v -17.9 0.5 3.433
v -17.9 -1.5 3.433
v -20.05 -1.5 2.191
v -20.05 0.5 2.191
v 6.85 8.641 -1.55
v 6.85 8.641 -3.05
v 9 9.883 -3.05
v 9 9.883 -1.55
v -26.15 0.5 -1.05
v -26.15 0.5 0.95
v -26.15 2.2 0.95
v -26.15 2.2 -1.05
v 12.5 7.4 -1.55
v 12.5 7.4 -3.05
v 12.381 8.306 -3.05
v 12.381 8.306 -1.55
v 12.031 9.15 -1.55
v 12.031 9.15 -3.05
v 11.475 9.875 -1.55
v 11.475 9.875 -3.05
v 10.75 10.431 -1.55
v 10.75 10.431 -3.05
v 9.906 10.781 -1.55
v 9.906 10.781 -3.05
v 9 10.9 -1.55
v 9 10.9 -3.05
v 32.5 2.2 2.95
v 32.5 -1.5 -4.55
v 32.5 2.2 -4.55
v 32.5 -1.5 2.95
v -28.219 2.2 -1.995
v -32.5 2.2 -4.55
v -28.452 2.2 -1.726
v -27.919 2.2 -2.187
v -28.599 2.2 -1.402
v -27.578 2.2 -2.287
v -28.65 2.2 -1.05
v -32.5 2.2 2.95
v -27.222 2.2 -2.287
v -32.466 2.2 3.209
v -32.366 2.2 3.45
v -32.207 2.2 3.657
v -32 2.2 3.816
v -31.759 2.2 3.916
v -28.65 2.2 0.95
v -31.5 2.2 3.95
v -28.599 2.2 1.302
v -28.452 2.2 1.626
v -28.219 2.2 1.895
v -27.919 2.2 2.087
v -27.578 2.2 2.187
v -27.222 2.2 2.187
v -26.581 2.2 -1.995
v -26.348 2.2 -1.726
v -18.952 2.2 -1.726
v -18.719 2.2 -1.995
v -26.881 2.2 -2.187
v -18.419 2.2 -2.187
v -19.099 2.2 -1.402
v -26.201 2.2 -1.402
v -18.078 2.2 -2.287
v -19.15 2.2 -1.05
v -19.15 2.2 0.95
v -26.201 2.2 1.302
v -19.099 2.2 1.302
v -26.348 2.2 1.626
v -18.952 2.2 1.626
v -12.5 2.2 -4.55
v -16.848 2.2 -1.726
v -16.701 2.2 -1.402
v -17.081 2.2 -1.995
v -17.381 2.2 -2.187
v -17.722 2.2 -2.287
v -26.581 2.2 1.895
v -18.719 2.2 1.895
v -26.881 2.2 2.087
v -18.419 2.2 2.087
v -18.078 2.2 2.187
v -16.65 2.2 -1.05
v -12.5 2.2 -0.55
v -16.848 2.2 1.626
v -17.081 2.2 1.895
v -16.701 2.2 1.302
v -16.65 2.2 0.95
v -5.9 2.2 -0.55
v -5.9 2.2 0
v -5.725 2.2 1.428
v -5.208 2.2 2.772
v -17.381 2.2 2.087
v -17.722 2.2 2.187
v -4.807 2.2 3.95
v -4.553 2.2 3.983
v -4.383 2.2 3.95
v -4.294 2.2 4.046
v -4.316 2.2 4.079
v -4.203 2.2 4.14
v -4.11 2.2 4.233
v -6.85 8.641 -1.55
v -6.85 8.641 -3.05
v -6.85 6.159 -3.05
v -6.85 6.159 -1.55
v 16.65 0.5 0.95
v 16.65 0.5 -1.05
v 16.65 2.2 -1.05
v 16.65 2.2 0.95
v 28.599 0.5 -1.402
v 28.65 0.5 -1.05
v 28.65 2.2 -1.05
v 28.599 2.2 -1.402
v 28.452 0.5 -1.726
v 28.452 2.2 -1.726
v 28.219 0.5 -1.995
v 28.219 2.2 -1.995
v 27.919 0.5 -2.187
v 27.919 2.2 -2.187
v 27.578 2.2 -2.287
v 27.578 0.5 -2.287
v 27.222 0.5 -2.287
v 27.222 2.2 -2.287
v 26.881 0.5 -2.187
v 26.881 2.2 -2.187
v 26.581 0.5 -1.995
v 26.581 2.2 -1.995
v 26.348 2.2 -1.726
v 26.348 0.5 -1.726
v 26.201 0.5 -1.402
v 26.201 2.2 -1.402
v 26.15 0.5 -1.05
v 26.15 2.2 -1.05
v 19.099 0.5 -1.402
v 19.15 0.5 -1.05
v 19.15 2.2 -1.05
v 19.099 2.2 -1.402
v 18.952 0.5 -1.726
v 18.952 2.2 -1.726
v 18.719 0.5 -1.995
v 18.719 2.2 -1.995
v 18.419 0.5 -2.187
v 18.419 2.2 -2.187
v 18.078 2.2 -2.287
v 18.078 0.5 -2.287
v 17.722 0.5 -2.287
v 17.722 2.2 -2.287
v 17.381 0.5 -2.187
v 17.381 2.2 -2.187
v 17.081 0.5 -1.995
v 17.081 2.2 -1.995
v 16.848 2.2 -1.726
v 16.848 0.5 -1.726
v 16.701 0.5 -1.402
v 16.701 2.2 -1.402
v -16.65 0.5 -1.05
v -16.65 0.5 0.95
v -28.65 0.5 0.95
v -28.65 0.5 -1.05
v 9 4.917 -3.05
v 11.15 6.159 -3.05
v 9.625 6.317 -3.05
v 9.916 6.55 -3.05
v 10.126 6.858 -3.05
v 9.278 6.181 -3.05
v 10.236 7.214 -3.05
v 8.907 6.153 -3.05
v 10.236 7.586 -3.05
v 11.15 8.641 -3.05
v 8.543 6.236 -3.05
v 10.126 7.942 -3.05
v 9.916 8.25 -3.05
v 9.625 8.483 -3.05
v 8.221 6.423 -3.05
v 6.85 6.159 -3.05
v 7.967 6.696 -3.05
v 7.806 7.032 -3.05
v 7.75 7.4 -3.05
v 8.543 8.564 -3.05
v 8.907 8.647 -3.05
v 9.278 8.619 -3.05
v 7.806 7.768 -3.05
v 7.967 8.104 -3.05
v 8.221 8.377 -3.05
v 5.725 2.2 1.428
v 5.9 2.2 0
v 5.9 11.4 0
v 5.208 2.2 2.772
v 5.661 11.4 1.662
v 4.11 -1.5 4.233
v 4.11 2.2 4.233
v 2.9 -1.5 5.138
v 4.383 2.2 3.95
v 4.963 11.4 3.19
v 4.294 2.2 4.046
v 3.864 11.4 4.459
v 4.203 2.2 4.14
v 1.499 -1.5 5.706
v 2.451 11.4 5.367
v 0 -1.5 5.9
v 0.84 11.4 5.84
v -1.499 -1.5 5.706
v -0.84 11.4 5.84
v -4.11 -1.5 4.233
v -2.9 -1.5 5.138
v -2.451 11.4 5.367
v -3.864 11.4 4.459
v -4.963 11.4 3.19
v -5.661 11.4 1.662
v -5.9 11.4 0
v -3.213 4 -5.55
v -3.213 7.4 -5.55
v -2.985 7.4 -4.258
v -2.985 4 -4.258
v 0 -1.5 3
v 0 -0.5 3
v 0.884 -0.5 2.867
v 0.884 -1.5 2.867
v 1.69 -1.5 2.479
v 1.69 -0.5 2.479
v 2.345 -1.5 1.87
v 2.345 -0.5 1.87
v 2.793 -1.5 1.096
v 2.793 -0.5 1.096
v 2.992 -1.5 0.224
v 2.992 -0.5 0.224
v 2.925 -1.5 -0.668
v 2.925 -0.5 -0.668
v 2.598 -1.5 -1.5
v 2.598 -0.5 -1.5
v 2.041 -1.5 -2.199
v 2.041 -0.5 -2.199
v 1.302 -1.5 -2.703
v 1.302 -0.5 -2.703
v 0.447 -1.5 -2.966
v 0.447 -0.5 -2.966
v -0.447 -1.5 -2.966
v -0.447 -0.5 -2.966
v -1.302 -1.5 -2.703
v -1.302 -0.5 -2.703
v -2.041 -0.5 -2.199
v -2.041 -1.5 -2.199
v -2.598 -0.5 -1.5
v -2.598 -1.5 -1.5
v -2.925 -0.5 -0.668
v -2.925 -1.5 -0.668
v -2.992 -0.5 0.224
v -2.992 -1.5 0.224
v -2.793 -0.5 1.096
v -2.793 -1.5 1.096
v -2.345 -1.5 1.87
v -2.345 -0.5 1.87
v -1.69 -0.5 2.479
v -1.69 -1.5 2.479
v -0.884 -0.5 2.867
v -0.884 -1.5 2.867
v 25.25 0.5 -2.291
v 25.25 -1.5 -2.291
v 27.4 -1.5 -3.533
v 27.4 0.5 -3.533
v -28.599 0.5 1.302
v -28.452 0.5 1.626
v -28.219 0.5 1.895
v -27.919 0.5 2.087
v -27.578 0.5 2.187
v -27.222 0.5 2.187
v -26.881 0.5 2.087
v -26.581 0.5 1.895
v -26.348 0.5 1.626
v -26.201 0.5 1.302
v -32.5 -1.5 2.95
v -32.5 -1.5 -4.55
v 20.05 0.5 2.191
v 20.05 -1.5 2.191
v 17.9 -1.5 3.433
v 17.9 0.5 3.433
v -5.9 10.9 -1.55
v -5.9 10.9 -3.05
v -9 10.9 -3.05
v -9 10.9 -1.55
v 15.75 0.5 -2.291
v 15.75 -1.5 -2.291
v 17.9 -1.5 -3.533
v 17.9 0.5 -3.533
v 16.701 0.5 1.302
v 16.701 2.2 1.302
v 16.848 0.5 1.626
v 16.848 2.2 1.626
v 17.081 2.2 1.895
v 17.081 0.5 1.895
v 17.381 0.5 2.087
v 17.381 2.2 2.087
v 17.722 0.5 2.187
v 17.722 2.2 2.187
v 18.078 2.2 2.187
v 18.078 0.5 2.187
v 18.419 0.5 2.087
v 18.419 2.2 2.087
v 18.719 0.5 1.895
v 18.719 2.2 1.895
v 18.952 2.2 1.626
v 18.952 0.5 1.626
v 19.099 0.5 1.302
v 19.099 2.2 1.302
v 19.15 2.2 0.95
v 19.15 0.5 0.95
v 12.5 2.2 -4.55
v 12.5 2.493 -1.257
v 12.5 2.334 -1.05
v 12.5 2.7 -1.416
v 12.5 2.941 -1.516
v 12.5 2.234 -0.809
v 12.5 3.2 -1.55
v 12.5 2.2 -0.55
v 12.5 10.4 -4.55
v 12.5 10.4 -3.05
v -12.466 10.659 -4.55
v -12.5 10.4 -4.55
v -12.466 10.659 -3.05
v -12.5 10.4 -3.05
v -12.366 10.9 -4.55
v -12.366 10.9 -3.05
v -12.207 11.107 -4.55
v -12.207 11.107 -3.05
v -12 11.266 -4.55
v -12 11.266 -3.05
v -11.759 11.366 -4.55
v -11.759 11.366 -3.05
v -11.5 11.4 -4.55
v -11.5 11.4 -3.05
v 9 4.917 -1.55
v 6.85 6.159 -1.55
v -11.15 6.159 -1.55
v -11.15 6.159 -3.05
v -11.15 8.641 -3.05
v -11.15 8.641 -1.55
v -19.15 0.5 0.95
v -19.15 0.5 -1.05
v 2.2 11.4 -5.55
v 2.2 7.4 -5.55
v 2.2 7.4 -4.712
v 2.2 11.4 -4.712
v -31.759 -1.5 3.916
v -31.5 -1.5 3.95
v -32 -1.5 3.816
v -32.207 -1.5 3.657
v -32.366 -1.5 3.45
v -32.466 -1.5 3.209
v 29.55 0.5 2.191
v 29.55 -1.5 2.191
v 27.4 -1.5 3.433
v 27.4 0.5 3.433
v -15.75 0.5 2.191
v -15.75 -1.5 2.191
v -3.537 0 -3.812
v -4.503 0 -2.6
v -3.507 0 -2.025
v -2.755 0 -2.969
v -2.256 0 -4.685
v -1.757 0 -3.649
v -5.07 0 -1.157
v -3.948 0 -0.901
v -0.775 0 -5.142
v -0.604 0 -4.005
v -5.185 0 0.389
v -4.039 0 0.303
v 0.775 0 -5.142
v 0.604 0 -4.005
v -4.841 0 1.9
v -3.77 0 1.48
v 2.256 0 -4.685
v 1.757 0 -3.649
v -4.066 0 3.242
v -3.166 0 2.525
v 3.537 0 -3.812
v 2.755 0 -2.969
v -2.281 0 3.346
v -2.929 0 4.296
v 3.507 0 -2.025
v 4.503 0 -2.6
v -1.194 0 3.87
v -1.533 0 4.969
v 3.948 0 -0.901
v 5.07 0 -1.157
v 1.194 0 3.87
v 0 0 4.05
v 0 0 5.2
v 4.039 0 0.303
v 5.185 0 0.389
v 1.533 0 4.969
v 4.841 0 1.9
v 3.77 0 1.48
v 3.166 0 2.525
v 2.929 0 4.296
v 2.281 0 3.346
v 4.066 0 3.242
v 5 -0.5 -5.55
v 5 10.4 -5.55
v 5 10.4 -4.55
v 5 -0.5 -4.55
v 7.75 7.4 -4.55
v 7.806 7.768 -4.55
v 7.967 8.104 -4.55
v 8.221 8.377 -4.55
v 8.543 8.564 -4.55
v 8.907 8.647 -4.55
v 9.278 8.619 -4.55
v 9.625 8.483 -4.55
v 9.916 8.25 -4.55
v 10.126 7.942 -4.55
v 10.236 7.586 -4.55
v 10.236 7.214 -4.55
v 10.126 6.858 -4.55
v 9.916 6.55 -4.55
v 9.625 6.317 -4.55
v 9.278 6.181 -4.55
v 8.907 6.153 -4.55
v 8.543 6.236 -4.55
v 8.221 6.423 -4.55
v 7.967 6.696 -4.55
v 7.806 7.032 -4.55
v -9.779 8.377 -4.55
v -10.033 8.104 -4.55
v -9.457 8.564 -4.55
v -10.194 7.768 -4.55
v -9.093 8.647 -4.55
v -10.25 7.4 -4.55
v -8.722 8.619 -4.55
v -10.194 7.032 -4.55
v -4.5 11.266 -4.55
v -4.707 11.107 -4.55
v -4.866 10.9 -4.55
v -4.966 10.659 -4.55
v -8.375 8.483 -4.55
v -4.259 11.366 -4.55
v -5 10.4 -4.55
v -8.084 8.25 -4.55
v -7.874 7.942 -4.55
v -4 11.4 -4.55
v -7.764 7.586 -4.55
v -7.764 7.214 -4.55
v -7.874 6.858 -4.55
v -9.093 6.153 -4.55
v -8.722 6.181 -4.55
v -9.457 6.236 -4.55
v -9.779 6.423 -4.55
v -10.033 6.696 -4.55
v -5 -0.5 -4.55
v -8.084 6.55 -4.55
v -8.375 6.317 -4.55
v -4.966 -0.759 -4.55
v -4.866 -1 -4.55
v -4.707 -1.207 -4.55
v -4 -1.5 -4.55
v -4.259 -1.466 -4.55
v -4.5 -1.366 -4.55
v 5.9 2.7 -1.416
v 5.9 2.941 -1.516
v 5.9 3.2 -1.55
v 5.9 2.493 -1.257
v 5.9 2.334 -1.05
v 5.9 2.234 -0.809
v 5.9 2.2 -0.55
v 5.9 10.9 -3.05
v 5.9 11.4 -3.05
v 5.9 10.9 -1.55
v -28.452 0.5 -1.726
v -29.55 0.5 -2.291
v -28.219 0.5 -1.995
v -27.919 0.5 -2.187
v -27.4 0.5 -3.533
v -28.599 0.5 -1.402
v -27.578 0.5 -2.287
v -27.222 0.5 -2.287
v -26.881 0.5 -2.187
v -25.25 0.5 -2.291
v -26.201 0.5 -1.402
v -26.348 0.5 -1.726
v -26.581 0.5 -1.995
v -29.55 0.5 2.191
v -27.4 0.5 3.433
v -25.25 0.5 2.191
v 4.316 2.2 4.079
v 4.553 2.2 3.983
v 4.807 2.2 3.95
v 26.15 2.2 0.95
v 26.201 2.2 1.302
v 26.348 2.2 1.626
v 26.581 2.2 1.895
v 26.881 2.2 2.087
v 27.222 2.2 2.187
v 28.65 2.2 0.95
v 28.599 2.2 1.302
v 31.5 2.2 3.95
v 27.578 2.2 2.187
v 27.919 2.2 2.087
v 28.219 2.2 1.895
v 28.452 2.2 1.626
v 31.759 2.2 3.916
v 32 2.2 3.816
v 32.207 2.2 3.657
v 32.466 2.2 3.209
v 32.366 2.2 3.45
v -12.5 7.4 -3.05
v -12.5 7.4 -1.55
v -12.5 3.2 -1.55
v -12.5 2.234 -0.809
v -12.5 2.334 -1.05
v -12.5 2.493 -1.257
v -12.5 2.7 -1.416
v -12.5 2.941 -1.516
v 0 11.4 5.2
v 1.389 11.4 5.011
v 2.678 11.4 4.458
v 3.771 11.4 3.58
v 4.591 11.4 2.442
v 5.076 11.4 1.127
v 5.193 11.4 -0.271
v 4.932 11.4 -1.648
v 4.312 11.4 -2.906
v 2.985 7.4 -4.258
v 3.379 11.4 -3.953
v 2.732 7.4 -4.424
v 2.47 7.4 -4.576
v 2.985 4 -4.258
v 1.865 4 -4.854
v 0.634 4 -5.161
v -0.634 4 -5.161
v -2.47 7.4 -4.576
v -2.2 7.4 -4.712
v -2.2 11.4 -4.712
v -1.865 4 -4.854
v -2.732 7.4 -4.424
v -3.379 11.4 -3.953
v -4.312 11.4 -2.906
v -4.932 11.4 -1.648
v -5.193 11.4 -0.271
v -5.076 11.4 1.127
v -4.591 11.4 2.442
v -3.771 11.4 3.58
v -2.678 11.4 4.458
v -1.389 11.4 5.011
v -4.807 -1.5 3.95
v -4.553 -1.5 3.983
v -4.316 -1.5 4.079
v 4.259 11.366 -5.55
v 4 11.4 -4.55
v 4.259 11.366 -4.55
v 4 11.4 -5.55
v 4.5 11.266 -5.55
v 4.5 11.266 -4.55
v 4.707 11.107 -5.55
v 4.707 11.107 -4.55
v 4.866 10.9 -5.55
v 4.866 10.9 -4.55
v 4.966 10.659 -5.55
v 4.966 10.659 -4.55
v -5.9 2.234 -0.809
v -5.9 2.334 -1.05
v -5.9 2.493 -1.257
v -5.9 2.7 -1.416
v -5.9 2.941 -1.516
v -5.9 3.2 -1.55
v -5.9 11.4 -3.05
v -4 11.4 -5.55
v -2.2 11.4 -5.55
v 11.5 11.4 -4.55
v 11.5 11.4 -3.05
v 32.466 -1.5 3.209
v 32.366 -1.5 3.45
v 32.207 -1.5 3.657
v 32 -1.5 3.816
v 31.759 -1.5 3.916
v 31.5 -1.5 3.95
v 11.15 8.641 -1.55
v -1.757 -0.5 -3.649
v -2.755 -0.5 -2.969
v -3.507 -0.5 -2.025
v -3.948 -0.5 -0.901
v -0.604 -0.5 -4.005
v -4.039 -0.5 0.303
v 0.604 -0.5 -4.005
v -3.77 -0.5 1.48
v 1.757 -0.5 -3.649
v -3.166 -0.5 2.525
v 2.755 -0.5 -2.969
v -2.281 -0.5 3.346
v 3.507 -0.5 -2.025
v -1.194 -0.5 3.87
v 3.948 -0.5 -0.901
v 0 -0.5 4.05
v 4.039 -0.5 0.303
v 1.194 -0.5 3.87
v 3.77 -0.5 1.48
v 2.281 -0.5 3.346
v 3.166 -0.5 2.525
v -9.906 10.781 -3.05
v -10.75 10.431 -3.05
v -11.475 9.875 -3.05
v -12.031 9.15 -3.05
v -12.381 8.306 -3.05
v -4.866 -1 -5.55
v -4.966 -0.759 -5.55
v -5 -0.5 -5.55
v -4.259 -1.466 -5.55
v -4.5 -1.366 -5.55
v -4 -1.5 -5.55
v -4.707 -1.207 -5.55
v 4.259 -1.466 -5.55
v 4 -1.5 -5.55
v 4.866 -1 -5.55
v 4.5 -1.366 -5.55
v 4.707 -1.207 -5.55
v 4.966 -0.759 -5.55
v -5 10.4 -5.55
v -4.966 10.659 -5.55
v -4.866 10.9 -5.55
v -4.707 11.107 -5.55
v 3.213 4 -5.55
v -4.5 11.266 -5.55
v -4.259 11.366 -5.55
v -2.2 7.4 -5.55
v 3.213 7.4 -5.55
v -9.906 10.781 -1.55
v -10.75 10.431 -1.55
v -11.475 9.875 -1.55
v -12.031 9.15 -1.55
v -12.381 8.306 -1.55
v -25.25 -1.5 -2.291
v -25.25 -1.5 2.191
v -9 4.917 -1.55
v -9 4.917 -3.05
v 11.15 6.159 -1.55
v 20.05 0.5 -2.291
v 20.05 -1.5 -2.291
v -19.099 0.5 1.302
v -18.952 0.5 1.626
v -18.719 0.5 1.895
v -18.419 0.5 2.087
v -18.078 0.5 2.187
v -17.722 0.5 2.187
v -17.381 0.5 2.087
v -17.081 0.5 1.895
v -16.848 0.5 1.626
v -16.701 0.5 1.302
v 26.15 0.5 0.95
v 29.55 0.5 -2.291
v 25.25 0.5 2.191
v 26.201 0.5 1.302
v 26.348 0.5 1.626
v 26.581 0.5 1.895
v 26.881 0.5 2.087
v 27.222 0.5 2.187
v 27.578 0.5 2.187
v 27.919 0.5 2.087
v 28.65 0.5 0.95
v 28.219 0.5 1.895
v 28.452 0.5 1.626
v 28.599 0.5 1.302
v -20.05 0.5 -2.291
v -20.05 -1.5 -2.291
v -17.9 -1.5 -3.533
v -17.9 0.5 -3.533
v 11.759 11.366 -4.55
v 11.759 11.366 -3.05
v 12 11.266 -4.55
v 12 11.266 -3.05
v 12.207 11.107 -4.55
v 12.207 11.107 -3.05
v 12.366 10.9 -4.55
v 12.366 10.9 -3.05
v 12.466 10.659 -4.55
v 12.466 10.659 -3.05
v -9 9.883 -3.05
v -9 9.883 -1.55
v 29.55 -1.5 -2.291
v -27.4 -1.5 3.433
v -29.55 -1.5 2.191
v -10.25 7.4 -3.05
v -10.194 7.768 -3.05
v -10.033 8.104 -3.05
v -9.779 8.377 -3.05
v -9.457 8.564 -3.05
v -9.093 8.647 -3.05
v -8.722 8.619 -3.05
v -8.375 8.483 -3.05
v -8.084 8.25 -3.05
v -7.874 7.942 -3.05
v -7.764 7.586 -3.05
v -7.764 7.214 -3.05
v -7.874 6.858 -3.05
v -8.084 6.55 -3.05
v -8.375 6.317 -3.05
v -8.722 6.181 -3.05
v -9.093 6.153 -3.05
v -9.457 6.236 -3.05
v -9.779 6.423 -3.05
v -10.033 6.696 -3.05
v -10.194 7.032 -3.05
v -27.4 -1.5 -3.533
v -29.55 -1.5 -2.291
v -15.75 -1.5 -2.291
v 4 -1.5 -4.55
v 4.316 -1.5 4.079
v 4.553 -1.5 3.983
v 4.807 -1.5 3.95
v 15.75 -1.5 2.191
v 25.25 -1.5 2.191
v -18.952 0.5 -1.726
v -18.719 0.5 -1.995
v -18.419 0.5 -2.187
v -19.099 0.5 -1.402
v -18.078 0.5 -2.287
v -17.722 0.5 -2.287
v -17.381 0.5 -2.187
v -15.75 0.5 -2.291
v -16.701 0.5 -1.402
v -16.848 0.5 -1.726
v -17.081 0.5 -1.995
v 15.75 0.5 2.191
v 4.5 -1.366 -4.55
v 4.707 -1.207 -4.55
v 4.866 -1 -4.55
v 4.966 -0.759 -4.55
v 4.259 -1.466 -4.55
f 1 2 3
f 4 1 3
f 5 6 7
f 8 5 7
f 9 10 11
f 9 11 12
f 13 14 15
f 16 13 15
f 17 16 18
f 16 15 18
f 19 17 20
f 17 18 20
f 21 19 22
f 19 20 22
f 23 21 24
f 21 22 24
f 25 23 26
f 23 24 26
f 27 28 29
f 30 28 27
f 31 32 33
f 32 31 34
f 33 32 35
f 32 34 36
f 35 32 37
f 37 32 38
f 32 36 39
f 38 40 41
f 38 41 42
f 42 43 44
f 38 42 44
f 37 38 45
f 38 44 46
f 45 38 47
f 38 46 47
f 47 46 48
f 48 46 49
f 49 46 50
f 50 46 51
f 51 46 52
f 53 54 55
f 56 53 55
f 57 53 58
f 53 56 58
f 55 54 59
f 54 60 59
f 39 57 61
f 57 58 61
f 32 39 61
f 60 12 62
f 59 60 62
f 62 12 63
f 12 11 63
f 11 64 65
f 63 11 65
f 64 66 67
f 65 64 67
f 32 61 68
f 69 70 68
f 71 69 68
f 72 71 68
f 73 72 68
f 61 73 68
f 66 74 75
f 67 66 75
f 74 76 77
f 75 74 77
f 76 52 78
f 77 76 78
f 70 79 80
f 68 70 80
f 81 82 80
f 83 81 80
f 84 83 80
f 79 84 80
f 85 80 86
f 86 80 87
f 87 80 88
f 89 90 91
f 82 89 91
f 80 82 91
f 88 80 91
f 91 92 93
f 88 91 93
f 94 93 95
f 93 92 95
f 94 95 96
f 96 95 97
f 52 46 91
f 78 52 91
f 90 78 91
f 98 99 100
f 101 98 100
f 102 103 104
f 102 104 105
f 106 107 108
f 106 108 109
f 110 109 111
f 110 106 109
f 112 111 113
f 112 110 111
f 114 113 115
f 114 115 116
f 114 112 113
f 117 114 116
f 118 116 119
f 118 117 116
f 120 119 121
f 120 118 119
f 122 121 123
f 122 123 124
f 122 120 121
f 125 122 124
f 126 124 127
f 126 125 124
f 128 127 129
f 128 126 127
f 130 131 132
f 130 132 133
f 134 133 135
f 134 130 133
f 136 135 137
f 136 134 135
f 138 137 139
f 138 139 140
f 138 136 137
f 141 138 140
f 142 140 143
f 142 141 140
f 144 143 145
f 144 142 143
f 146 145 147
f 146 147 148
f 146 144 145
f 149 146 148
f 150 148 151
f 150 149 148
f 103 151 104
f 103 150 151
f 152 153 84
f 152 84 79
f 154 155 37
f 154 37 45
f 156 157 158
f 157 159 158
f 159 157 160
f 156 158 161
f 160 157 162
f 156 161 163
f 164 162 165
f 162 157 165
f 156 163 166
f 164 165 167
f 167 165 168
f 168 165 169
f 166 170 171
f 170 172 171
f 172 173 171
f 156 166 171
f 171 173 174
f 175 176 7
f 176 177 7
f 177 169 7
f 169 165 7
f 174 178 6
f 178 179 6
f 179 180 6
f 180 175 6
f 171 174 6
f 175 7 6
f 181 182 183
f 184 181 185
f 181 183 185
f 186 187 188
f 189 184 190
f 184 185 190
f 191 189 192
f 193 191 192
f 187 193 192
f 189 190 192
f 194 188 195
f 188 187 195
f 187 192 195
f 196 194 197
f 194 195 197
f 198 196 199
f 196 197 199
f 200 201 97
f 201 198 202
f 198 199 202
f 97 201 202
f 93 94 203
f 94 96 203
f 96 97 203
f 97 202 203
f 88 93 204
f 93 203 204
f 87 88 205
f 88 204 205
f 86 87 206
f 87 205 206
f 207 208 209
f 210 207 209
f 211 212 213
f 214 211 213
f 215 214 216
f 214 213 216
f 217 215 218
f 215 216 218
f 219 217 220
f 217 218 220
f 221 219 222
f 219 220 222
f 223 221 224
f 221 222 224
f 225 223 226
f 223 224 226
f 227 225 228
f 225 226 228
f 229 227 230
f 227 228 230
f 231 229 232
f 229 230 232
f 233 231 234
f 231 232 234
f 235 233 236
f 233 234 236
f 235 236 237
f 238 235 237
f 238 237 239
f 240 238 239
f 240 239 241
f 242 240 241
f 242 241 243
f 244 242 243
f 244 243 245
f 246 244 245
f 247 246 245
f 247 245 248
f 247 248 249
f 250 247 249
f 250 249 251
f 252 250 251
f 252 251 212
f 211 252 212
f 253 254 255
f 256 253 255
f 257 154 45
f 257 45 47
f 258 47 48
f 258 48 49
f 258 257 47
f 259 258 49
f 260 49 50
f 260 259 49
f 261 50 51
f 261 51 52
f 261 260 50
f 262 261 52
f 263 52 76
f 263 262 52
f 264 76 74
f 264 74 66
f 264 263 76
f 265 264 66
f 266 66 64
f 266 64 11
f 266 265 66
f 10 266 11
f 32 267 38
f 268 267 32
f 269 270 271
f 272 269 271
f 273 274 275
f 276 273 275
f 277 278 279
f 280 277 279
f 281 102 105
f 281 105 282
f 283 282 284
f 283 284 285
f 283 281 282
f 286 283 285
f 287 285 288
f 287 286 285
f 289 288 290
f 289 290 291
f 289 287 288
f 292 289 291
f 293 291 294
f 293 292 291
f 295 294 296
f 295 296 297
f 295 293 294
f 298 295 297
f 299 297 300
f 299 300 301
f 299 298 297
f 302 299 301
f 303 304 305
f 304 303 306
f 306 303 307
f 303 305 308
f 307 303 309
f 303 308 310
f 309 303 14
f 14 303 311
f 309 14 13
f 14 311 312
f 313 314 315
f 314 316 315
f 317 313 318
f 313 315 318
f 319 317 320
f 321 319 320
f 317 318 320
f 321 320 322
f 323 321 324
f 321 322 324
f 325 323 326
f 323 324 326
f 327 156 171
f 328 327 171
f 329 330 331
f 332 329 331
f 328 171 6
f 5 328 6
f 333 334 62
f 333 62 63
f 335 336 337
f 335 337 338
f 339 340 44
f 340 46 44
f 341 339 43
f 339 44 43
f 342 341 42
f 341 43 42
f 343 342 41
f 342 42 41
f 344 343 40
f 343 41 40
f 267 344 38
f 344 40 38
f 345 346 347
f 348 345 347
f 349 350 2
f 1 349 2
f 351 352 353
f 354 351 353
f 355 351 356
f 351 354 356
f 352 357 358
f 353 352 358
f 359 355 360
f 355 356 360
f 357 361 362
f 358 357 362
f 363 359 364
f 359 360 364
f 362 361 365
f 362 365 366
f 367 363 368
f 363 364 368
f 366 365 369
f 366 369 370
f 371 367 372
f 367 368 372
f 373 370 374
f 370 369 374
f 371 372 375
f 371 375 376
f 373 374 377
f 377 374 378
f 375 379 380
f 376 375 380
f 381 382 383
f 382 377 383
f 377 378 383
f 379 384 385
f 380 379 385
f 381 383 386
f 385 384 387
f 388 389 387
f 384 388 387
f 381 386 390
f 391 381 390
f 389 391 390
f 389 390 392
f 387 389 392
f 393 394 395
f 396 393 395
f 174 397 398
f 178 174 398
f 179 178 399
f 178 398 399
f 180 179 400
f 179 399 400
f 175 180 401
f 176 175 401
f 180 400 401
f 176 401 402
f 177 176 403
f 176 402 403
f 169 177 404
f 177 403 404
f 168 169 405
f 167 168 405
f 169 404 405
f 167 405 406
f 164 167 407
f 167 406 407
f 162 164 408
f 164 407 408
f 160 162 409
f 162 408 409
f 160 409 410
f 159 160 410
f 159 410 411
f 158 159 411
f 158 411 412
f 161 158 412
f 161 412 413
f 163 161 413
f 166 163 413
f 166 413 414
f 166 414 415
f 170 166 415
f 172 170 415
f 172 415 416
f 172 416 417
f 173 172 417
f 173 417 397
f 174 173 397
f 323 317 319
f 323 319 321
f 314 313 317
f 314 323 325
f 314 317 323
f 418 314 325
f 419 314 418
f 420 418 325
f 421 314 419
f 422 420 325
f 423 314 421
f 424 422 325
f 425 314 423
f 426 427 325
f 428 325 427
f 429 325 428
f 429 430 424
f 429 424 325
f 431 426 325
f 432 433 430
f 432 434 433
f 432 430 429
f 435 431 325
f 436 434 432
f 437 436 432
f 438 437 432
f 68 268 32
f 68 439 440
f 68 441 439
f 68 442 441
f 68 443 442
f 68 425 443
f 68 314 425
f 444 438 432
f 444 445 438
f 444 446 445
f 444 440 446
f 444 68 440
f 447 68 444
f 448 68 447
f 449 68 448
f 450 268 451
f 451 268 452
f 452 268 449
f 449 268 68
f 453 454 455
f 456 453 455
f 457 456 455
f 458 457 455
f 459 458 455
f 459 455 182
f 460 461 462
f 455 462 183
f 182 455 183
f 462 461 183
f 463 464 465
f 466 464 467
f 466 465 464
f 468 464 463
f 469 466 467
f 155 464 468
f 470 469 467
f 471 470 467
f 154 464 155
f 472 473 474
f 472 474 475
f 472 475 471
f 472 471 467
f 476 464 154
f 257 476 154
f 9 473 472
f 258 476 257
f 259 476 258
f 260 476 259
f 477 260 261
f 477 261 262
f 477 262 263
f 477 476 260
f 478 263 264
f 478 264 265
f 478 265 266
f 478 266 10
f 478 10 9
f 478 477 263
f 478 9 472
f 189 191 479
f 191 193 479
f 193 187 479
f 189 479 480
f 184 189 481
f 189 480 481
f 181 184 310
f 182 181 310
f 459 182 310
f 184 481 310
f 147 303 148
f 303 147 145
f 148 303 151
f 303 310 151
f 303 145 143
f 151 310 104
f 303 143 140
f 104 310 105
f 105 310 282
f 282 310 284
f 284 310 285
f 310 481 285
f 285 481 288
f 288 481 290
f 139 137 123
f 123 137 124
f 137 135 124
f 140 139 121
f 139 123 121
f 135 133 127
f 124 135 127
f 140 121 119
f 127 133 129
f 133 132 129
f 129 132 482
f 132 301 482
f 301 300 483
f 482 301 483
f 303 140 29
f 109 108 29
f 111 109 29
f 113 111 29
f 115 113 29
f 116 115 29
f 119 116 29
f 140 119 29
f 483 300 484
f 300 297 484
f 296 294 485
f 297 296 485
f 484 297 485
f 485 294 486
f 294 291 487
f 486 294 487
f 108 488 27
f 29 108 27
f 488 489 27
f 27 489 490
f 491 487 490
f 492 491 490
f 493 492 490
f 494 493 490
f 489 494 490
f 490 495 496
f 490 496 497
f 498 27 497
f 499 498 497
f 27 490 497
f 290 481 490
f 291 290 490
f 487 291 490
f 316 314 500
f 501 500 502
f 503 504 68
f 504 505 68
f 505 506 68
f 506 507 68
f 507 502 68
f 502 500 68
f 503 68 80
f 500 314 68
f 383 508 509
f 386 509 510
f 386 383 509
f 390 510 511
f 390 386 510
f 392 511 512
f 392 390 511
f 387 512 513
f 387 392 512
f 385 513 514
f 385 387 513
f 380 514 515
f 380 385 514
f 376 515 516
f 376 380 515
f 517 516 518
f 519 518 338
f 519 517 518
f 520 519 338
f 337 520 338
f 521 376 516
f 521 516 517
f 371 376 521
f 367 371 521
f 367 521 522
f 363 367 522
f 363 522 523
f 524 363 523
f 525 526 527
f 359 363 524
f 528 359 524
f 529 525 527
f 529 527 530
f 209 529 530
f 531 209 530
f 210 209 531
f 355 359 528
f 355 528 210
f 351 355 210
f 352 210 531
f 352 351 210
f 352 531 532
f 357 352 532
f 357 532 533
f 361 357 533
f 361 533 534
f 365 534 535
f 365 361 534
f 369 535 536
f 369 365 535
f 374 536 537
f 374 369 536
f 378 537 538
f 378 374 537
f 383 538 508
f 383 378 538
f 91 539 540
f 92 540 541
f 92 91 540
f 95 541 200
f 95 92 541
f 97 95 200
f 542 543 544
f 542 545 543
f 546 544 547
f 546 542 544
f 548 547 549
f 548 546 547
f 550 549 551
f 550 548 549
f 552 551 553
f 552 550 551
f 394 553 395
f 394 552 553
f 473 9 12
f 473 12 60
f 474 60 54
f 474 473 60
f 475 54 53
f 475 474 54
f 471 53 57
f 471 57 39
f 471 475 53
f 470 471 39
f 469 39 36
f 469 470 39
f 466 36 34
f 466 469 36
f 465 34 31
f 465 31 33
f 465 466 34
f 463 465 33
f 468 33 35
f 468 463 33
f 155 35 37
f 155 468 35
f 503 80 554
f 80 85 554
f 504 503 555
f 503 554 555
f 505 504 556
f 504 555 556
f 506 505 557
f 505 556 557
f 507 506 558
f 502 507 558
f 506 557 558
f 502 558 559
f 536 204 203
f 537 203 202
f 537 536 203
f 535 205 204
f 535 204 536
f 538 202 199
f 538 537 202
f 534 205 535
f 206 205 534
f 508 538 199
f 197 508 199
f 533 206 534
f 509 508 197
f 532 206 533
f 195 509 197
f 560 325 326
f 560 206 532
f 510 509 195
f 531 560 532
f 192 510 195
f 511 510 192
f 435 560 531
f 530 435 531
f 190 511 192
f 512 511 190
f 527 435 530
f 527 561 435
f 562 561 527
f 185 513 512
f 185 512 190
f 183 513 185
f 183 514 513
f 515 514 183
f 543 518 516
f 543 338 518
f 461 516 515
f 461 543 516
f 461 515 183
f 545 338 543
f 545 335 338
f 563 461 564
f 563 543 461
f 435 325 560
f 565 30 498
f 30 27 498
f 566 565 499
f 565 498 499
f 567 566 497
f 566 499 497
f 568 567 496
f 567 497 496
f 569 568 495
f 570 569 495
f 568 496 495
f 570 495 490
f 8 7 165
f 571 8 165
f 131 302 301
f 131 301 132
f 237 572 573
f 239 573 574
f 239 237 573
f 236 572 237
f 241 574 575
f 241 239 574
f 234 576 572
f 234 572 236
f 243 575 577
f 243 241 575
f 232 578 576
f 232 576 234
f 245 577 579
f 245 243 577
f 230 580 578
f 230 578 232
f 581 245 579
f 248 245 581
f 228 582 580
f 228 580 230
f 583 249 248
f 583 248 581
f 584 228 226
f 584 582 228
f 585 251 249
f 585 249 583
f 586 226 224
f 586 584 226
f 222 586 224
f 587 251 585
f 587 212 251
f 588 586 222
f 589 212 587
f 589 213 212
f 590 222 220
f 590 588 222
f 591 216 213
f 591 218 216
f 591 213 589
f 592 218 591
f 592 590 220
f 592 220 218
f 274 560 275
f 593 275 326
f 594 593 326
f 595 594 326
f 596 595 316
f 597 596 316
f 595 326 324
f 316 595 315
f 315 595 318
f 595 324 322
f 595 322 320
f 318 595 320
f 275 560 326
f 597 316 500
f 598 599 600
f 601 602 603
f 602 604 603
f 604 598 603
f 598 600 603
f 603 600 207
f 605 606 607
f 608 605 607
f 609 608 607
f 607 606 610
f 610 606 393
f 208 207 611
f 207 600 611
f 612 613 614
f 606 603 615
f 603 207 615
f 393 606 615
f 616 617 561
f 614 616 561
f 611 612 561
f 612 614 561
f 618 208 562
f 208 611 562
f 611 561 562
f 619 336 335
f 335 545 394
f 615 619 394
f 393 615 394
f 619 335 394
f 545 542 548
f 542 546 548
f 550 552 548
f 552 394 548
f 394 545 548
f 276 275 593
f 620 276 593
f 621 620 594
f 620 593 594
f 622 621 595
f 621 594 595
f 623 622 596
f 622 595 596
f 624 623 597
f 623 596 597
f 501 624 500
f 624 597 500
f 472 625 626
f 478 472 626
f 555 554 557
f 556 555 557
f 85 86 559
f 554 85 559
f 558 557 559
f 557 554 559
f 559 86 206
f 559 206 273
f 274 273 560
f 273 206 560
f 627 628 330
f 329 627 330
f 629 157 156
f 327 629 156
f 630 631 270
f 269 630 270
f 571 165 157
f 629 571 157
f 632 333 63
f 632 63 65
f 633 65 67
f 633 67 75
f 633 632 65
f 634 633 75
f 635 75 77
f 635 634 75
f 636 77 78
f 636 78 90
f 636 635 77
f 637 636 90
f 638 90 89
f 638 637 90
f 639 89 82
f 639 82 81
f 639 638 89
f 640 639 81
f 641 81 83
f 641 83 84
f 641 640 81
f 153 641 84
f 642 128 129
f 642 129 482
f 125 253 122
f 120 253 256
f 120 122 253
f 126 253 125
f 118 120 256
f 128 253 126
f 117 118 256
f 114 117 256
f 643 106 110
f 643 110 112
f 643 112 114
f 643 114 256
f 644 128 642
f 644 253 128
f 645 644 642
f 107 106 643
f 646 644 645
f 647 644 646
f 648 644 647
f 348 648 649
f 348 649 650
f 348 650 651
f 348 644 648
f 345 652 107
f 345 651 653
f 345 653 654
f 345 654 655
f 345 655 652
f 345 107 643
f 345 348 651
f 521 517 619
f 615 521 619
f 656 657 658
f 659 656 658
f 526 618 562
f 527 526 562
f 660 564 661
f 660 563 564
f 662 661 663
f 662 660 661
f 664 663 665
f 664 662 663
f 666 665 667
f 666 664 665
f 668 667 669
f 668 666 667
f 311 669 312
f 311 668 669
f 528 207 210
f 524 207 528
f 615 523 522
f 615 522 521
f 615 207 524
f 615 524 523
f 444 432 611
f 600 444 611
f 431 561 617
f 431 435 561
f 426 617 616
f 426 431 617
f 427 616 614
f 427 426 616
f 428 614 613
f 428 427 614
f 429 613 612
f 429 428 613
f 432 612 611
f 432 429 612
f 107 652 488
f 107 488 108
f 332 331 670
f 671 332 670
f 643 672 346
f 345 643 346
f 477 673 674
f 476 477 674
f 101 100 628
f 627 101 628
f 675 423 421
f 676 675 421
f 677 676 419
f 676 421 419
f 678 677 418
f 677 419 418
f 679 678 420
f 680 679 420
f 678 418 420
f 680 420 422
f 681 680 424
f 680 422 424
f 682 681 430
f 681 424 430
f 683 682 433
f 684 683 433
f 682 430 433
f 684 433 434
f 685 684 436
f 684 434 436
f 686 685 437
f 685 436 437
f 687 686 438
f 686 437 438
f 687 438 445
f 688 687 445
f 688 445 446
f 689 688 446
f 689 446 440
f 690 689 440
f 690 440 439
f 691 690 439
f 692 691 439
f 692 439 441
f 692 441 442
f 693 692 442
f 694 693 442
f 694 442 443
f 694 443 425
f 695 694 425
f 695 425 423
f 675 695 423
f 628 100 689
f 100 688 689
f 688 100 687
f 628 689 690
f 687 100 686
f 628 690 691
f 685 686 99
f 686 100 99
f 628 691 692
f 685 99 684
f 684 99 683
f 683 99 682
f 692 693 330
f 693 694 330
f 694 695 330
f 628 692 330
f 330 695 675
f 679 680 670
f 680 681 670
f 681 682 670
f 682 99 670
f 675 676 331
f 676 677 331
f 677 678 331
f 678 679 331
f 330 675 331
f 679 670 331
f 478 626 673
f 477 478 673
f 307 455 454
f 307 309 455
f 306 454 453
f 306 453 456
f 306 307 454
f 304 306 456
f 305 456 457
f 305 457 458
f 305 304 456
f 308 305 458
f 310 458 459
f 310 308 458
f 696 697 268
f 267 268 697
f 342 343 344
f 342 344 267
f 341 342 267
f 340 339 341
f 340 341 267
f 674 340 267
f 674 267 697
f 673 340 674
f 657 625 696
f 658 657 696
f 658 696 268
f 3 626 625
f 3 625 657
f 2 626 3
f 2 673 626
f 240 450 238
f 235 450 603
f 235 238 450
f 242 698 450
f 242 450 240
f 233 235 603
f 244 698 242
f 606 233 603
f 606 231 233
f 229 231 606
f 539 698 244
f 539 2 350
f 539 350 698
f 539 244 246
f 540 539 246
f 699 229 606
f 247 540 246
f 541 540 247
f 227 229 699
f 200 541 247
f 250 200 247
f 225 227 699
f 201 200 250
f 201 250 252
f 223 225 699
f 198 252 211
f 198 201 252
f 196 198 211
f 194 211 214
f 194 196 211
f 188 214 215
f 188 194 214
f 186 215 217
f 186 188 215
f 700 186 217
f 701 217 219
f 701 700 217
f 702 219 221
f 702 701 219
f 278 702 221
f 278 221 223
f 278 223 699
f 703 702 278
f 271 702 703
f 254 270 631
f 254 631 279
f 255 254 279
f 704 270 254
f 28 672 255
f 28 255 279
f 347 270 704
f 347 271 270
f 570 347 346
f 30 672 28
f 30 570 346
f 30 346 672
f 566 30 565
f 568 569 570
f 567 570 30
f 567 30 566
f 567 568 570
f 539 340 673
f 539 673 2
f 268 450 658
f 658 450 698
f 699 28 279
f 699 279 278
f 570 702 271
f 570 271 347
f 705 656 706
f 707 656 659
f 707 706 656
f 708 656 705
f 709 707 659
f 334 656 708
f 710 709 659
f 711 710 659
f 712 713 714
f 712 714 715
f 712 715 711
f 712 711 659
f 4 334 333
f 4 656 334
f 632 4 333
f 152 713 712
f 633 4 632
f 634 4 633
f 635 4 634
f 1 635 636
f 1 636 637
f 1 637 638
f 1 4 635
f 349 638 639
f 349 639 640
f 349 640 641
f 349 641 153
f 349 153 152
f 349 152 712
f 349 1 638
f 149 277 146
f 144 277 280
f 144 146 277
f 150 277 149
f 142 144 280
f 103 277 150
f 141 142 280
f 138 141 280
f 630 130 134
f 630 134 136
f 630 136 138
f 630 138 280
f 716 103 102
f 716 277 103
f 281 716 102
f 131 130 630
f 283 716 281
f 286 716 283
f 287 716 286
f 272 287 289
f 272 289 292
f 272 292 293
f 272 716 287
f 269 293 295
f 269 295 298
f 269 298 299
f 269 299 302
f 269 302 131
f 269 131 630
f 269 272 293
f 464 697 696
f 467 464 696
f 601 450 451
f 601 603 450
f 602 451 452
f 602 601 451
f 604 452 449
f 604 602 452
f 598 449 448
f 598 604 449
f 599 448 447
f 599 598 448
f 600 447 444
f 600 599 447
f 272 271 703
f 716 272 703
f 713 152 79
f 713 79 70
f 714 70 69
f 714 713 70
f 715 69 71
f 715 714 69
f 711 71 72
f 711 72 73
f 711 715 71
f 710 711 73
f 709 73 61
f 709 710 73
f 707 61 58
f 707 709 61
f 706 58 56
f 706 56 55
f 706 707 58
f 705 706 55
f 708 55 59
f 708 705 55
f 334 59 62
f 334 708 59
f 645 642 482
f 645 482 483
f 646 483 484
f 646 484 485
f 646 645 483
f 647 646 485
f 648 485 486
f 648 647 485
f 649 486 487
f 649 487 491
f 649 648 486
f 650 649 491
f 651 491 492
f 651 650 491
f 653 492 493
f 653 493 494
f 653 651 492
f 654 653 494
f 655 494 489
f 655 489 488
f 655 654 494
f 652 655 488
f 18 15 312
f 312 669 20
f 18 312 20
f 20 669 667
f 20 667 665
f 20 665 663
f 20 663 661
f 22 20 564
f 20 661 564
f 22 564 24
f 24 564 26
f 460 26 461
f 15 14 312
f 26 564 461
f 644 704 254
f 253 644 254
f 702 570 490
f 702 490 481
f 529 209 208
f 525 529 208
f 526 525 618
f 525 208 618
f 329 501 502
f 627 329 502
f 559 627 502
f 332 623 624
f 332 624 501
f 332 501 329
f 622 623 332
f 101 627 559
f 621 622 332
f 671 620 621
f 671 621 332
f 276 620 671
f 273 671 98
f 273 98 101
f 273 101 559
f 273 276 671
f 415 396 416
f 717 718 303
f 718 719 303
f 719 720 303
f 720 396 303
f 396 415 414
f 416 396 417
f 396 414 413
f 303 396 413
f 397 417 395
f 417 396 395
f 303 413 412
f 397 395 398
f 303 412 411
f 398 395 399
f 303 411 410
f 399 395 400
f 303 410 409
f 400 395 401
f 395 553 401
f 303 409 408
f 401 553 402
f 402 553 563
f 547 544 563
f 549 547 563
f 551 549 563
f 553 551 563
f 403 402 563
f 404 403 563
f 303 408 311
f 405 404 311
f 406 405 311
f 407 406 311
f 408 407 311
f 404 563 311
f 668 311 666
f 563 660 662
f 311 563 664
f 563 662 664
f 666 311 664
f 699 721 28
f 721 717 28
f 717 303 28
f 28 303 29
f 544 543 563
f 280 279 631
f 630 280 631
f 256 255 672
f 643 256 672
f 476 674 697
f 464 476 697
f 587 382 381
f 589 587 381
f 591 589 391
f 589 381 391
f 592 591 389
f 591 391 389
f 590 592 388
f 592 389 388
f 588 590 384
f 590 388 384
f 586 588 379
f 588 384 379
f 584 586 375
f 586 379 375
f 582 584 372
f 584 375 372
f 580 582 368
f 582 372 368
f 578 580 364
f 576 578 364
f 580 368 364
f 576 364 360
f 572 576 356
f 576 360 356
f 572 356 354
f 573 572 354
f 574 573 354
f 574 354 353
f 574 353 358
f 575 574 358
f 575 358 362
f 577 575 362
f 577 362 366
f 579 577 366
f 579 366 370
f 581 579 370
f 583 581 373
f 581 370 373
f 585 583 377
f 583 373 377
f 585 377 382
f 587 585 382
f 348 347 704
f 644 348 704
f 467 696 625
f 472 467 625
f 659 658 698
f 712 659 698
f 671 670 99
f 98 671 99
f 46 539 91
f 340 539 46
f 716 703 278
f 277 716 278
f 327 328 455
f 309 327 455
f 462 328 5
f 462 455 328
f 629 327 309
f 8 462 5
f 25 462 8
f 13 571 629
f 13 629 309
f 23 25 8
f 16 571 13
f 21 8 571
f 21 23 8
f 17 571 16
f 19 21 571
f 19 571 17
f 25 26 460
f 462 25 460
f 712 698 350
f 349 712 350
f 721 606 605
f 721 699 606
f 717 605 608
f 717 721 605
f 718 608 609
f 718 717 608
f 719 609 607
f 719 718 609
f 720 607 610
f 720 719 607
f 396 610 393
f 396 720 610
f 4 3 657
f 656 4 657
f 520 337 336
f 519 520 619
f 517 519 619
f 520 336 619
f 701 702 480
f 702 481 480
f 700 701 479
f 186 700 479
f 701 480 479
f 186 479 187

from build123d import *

# Parameters (mm, degrees)
SKETCH1_R                         = 5.2
BASE_SHAPE_DEPTH                  = 11.4
BOTTOM_EXTRUDE_DEPTH              = 1.5
PIN_CUT_REACH                     = 19.917
SKETCH3_R                         = 3
M2_SCREW_HOLES_REACH              = 21.885
SKETCH5_R                         = 1.25
EXTRA_THREAD_EXTRUDES_DEPTH       = 1.5
SKETCH7_R                         = 4.05
INNER_BEARING_FREE_CUT_DEPTH      = 0.5
BUMPER_CUT_DEPTH                  = 1.7
MILLED_HOLE_FILLETS_R             = 1
BUMPER_BODY_TOP_CUT_REACH         = 22.428
BUMPER_BODY_TOP_CUT_END_RADIUS    = 5.2
SKETCH9_W                         = 4.4
SKETCH9_H                         = 4
BUMPER_SWITCH_MOUNT_EXTRUDE_DEPTH = 3.7
BUMPER_SWITCH_MOUNT_FILLETS_R     = 1
BUMPER_SWITCH_NUT_CUTS_DEPTH      = 2


with BuildPart() as part:
    # Sketch1 → Base shape (new body)
    with BuildSketch(Plane(origin=(0, 0, 0), x_dir=(1, 0, 0), z_dir=(0, 1, 0))):
        with BuildLine():
            ThreePointArc((-5.9, 0), (0, -5.9), (5.9, 0))
            Line((5.9, 0), (5.9, 3.05))
            Line((5.9, 3.05), (12.5, 3.05))
            Line((12.5, 3.05), (12.5, 4.55))
            Line((12.5, 4.55), (5, 4.55))
            Line((5, 4.55), (5, 5.55))
            Line((5, 5.55), (-5, 5.55))
            Line((-5, 5.55), (-5, 4.55))
            Line((-5, 4.55), (-12.5, 4.55))
            Line((-12.5, 4.55), (-12.5, 3.05))
            Line((-12.5, 3.05), (-5.9, 3.05))
            Line((-5.9, 3.05), (-5.9, 0))
        make_face()
        with Locations(Location((0, 0, 0), (0, 0, 270))):
            Circle(SKETCH1_R, mode=Mode.SUBTRACT)
    extrude(amount=BASE_SHAPE_DEPTH)

    # Sketch2 → Bottom extrude (add)
    with BuildSketch(Plane.XZ):
        with BuildLine():
            Line((-5.9, -3.05), (-12.5, -3.05))
            Line((-12.5, -3.05), (-12.5, -4.55))
            Line((-12.5, -4.55), (-5, -4.55))
            Line((-5, -4.55), (-5, -5.55))
            Line((-5, -5.55), (5, -5.55))
            Line((5, -5.55), (5, -4.55))
            Line((5, -4.55), (12.5, -4.55))
            Line((12.5, -4.55), (12.5, -3.05))
            Line((12.5, -3.05), (5.9, -3.05))
            Line((5.9, -3.05), (5.9, 0))
            ThreePointArc((5.9, 0), (0, 5.9), (-5.9, 0))
            Line((-5.9, 0), (-5.9, -3.05))
        make_face()
    extrude(amount=BOTTOM_EXTRUDE_DEPTH)

    # Sketch3 → Pin cut (cut, up to next)
    with BuildSketch(Plane(origin=(0, 0, 0), x_dir=(1, 0, 0), z_dir=(0, 1, 0)), mode=Mode.PRIVATE) as pin_cut_sk1:
        with Locations(Location((0, 0, 0), (0, 0, 270))):
            Circle(SKETCH3_R)
    pin_cut_tool1 = extrude(pin_cut_sk1.sketch, amount=-PIN_CUT_REACH, mode=Mode.PRIVATE) & part.part
    add(pin_cut_tool1.solids().sort_by_distance((0, 0, 0))[0], mode=Mode.SUBTRACT)

    # Sketch5 → M2 screw holes (cut, up to next)
    with BuildSketch(Plane(origin=(0, 0, -4.55), x_dir=(-1, 0, 0), z_dir=(0, 0, -1)), mode=Mode.PRIVATE) as m2_screw_holes_sk1:
        with Locations((-9, 7.4)):
            Circle(SKETCH5_R)
    m2_screw_holes_tool1 = extrude(m2_screw_holes_sk1.sketch, amount=-M2_SCREW_HOLES_REACH, mode=Mode.PRIVATE) & part.part
    # Sketch5 → M2 screw holes (cut, up to next)
    with BuildSketch(Plane(origin=(0, 0, -4.55), x_dir=(-1, 0, 0), z_dir=(0, 0, -1)), mode=Mode.PRIVATE) as m2_screw_holes_sk2:
        with Locations((9, 7.4)):
            Circle(SKETCH5_R)
    m2_screw_holes_tool2 = extrude(m2_screw_holes_sk2.sketch, amount=-M2_SCREW_HOLES_REACH, mode=Mode.PRIVATE) & part.part
    add(m2_screw_holes_tool1.solids().sort_by_distance((9, 7.4, -4.55))[0], mode=Mode.SUBTRACT)
    add(m2_screw_holes_tool2.solids().sort_by_distance((-9, 7.4, -4.55))[0], mode=Mode.SUBTRACT)

    # Sketch6 → Extra thread extrudes (add)
    with BuildSketch(Plane.XY.offset(-3.05)):
        with BuildLine():
            Line((-5.9, 5.775192319), (-5.9, 9.024807681))
            ThreePointArc((-5.9, 9.024807681), (-7.18848501, 10.394730946), (-9, 10.9))
            ThreePointArc((-9, 10.9), (-11.474873734, 9.874873734), (-12.5, 7.4))
            ThreePointArc((-12.5, 7.4), (-9.836660027, 4.001470906), (-5.9, 5.775192319))
        make_face()
        Polygon((-11.15, 8.641303079), (-9, 9.882606158), (-6.85, 8.641303079), (-6.85, 6.158696921), (-9, 4.917393842), (-11.15, 6.158696921), align=None, mode=Mode.SUBTRACT)
        with BuildLine():
            Line((-5.9, -1.5), (-5.9, 5.775192319))
            ThreePointArc((-5.9, 5.775192319), (-9.836660027, 4.001470906), (-12.5, 7.4))
            Line((-12.5, 7.4), (-12.5, -1.5))
            Line((-12.5, -1.5), (-5.9, -1.5))
        make_face()
        with BuildLine():
            ThreePointArc((5.9, 5.775192319), (9.836660027, 4.001470906), (12.5, 7.4))
            ThreePointArc((12.5, 7.4), (11.474873734, 9.874873734), (9, 10.9))
            ThreePointArc((9, 10.9), (7.18848501, 10.394730946), (5.9, 9.024807681))
            Line((5.9, 9.024807681), (5.9, 5.775192319))
        make_face()
        Polygon((6.85, 6.158696921), (6.85, 8.641303079), (9, 9.882606158), (11.15, 8.641303079), (11.15, 6.158696921), (9, 4.917393842), align=None, mode=Mode.SUBTRACT)
        with BuildLine():
            Line((5.9, -1.5), (12.5, -1.5))
            Line((12.5, -1.5), (12.5, 7.4))
            ThreePointArc((12.5, 7.4), (9.836660027, 4.001470906), (5.9, 5.775192319))
            Line((5.9, 5.775192319), (5.9, -1.5))
        make_face()
        with BuildLine():
            ThreePointArc((5.9, 9.024807681), (7.18848501, 10.394730946), (9, 10.9))
            Line((9, 10.9), (5.9, 10.9))
            Line((5.9, 10.9), (5.9, 9.024807681))
        make_face()
        with BuildLine():
            Line((-5.9, 9.024807681), (-5.9, 10.9))
            Line((-5.9, 10.9), (-9, 10.9))
            ThreePointArc((-9, 10.9), (-7.18848501, 10.394730946), (-5.9, 9.024807681))
        make_face()
    extrude(amount=EXTRA_THREAD_EXTRUDES_DEPTH)

    # Sketch7 → Inner bearing free cut (cut)
    with BuildSketch(Plane(origin=(0, 0, 0), x_dir=(1, 0, 0), z_dir=(0, 1, 0))):
        with Locations(Location((0, 0, 0), (0, 0, 270))):
            Circle(SKETCH7_R)
    extrude(amount=-INNER_BEARING_FREE_CUT_DEPTH, mode=Mode.SUBTRACT)

    # Sketch8 → Bumper cut (cut, symmetric)
    with BuildSketch(Plane(origin=(0, 5.7, 0), x_dir=(1, 0, 0), z_dir=(0, 1, 0))):
        with BuildLine():
            Line((-3.212553289, 5.55), (-2.166577057, -0.382025991))
            ThreePointArc((-2.166577057, -0.382025991), (-1.685297775, 1.414132741), (0, 2.2))
            Line((0, 2.2), (0, 5.55))
            Line((0, 5.55), (-3.212553289, 5.55))
        make_face()
        with BuildLine():
            Line((0, 5.55), (0, 2.2))
            ThreePointArc((0, 2.2), (1.555634919, 1.555634919), (2.2, 0))
            ThreePointArc((2.2, 0), (2.191628336, -0.191742634), (2.166577057, -0.382025991))
            Line((2.166577057, -0.382025991), (3.212553289, 5.55))
            Line((3.212553289, 5.55), (0, 5.55))
        make_face()
        with BuildLine():
            ThreePointArc((0, 2.2), (-1.685297775, 1.414132741), (-2.166577057, -0.382025991))
            ThreePointArc((-2.166577057, -0.382025991), (-1.414132741, -1.685297775), (0, -2.2))
            Line((0, -2.2), (0, 2.2))
        make_face()
        with BuildLine():
            ThreePointArc((2.2, 0), (1.555634919, 1.555634919), (0, 2.2))
            Line((0, 2.2), (0, -2.2))
            ThreePointArc((0, -2.2), (1.414132741, -1.685297775), (2.166577057, -0.382025991))
            ThreePointArc((2.166577057, -0.382025991), (2.191628336, -0.191742634), (2.2, 0))
        make_face()
    extrude(amount=BUMPER_CUT_DEPTH, both=True, mode=Mode.SUBTRACT)

    # Milled hole fillets
    milled_hole_fillets_edges = [part.edges().sort_by_distance(p)[0] for p in [
        (12.5, 11.4, -3.8),
        (5, 11.4, -5.05),
        (-5, 11.4, -5.05),
        (-12.5, 11.4, -3.8),
        (-5, -1.5, -5.05),
        (5, -1.5, -5.05),
    ]]
    fillet(milled_hole_fillets_edges, radius=MILLED_HOLE_FILLETS_R)

    # Bumper body top cut: up to this cylinder (the profile starts outside it)
    bumper_body_top_cut_end = Plane(origin=(0, 9.4, 0), z_dir=(0, -1, 0)) * Cylinder(BUMPER_BODY_TOP_CUT_END_RADIUS, 56.256, mode=Mode.PRIVATE)
    # Sketch9 → Bumper body top cut (cut, up to the surface)
    with BuildSketch(Plane(origin=(0, 0, -5.55), x_dir=(-1, 0, 0), z_dir=(0, 0, -1)), mode=Mode.PRIVATE) as bumper_body_top_cut_sk1:
        with Locations((0, 9.4)):
            Rectangle(SKETCH9_W, SKETCH9_H)
    bumper_body_top_cut_tool1 = extrude(bumper_body_top_cut_sk1.sketch, amount=-BUMPER_BODY_TOP_CUT_REACH, mode=Mode.PRIVATE) - bumper_body_top_cut_end
    add(bumper_body_top_cut_tool1.solids().sort_by_distance((0, 9.4, -5.55))[0], mode=Mode.SUBTRACT)

    # Sketch10 → Bumper switch mount extrude (add)
    with BuildSketch(Plane.XZ.offset(1.5)):
        with BuildLine():
            Line((-4.382636193, 3.95), (-32.5, 3.95))
            Line((-32.5, 3.95), (-32.5, -4.55))
            Line((-32.5, -4.55), (-12.5, -4.55))
            Line((-12.5, -4.55), (-12.5, -1.55))
            Line((-12.5, -1.55), (-5.9, -1.55))
            Line((-5.9, -1.55), (-5.9, 0))
            ThreePointArc((-5.9, 0), (-5.507610804, 2.115708683), (-4.382636193, 3.95))
        make_face()
        with BuildLine():
            Line((-19.15, -1.05), (-19.15, 0.95))
            ThreePointArc((-19.15, 0.95), (-17.9, 2.2), (-16.65, 0.95))
            Line((-16.65, 0.95), (-16.65, -1.05))
            ThreePointArc((-16.65, -1.05), (-17.9, -2.3), (-19.15, -1.05))
        make_face(mode=Mode.SUBTRACT)
        with BuildLine():
            Line((-26.15, 0.95), (-26.15, -1.05))
            ThreePointArc((-26.15, -1.05), (-27.4, -2.3), (-28.65, -1.05))
            Line((-28.65, -1.05), (-28.65, 0.95))
            ThreePointArc((-28.65, 0.95), (-27.4, 2.2), (-26.15, 0.95))
        make_face(mode=Mode.SUBTRACT)
        with BuildLine():
            Line((32.5, 3.95), (4.382636193, 3.95))
            ThreePointArc((4.382636193, 3.95), (5.507610804, 2.115708683), (5.9, 0))
            Line((5.9, 0), (5.9, -1.55))
            Line((5.9, -1.55), (12.5, -1.55))
            Line((12.5, -1.55), (12.5, -4.55))
            Line((12.5, -4.55), (32.5, -4.55))
            Line((32.5, -4.55), (32.5, 3.95))
        make_face()
        with BuildLine():
            Line((19.15, 0.95), (19.15, -1.05))
            ThreePointArc((19.15, -1.05), (17.9, -2.3), (16.65, -1.05))
            Line((16.65, -1.05), (16.65, 0.95))
            ThreePointArc((16.65, 0.95), (17.9, 2.2), (19.15, 0.95))
        make_face(mode=Mode.SUBTRACT)
        with BuildLine():
            ThreePointArc((28.65, -1.05), (27.4, -2.3), (26.15, -1.05))
            Line((26.15, -1.05), (26.15, 0.95))
            ThreePointArc((26.15, 0.95), (27.4, 2.2), (28.65, 0.95))
            Line((28.65, 0.95), (28.65, -1.05))
        make_face(mode=Mode.SUBTRACT)
    extrude(amount=-BUMPER_SWITCH_MOUNT_EXTRUDE_DEPTH)

    # Bumper switch mount fillets
    bumper_switch_mount_fillets_edges = [part.edges().sort_by_distance(p)[0] for p in [
        (-32.5, 0.35, 3.95),
        (-4.382636193, 0.35, 3.95),
        (-9.2, 2.2, -1.55),
        (4.382636193, 0.35, 3.95),
        (32.5, 0.35, 3.95),
        (9.2, 2.2, -1.55),
    ]]
    fillet(bumper_switch_mount_fillets_edges, radius=BUMPER_SWITCH_MOUNT_FILLETS_R)

    # Sketch12 → Bumper switch nut cuts (cut)
    with BuildSketch(Plane.XZ.offset(1.5)):
        Polygon((-25.25, 2.191303079), (-27.4, 3.432606158), (-29.55, 2.191303079), (-29.55, -2.291303079), (-27.4, -3.532606158), (-25.25, -2.291303079), align=None)
        with BuildLine():
            Line((-26.15, 0.95), (-26.15, -1.05))
            ThreePointArc((-26.15, -1.05), (-27.4, -2.3), (-28.65, -1.05))
            Line((-28.65, -1.05), (-28.65, 0.95))
            ThreePointArc((-28.65, 0.95), (-27.4, 2.2), (-26.15, 0.95))
        make_face(mode=Mode.SUBTRACT)
        Polygon((-20.05, -2.291303079), (-17.9, -3.532606158), (-15.75, -2.291303079), (-15.75, 2.191303079), (-17.9, 3.432606158), (-20.05, 2.191303079), align=None)
        with BuildLine():
            Line((-19.15, -1.05), (-19.15, 0.95))
            ThreePointArc((-19.15, 0.95), (-17.9, 2.2), (-16.65, 0.95))
            Line((-16.65, 0.95), (-16.65, -1.05))
            ThreePointArc((-16.65, -1.05), (-17.9, -2.3), (-19.15, -1.05))
        make_face(mode=Mode.SUBTRACT)
        Polygon((15.75, -2.291303079), (17.9, -3.532606158), (20.05, -2.291303079), (20.05, 2.191303079), (17.9, 3.432606158), (15.75, 2.191303079), align=None)
        with BuildLine():
            ThreePointArc((16.65, 0.95), (17.9, 2.2), (19.15, 0.95))
            Line((19.15, 0.95), (19.15, -1.05))
            ThreePointArc((19.15, -1.05), (17.9, -2.3), (16.65, -1.05))
            Line((16.65, -1.05), (16.65, 0.95))
        make_face(mode=Mode.SUBTRACT)
        Polygon((27.4, -3.532606158), (29.55, -2.291303079), (29.55, 2.191303079), (27.4, 3.432606158), (25.25, 2.191303079), (25.25, -2.291303079), align=None)
        with BuildLine():
            ThreePointArc((28.65, -1.05), (27.4, -2.3), (26.15, -1.05))
            Line((26.15, -1.05), (26.15, 0.95))
            ThreePointArc((26.15, 0.95), (27.4, 2.2), (28.65, 0.95))
            Line((28.65, 0.95), (28.65, -1.05))
        make_face(mode=Mode.SUBTRACT)
    extrude(amount=-BUMPER_SWITCH_NUT_CUTS_DEPTH, mode=Mode.SUBTRACT)


solid = part.part
